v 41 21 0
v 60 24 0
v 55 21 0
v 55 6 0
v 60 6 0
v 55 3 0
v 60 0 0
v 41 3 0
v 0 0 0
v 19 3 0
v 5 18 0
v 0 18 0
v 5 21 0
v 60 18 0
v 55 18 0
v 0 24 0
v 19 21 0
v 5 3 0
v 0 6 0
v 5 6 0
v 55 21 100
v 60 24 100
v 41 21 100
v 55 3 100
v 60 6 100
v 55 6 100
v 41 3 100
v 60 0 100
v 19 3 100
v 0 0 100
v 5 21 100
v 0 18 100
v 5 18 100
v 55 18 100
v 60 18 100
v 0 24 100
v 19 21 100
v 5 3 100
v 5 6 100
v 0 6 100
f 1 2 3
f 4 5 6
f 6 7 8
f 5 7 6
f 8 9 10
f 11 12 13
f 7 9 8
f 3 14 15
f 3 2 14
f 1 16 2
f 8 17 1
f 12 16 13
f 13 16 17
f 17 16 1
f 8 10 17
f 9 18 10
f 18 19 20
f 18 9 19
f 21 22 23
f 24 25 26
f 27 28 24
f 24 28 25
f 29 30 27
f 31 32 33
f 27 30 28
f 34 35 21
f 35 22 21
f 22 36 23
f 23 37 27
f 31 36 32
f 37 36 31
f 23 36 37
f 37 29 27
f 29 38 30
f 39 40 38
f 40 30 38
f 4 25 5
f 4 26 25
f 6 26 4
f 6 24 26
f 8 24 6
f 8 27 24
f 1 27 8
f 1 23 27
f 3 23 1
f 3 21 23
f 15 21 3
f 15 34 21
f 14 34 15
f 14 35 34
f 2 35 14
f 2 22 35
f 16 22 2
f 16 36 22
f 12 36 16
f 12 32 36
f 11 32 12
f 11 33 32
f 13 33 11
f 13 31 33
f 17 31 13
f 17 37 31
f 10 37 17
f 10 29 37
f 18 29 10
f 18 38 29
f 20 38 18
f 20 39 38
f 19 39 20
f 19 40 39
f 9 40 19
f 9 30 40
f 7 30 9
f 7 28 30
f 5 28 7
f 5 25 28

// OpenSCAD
$fn = 32;

// ----------------------------------------------------------------------
// T-slot rail: 60 x 24 mm section, 100 mm long
// ----------------------------------------------------------------------

// --- parameters (mm) ---
profile_height = 100;     // extrusion height
profile_points = 20;      // points of the closed outline

profile = [[0, 0], [60, 0], [60, 6], [55, 6], [55, 3], [41, 3], [41, 21], [55, 21], [55, 18], [60, 18], [60, 24], [0, 24], [0, 18], [5, 18], [5, 21], [19, 21], [19, 3], [5, 3], [5, 6], [0, 6]];  // single closed polygon, 20 points, counter clockwise

// --- the one profile operation ---
linear_extrude(height = profile_height) polygon(points = profile);
